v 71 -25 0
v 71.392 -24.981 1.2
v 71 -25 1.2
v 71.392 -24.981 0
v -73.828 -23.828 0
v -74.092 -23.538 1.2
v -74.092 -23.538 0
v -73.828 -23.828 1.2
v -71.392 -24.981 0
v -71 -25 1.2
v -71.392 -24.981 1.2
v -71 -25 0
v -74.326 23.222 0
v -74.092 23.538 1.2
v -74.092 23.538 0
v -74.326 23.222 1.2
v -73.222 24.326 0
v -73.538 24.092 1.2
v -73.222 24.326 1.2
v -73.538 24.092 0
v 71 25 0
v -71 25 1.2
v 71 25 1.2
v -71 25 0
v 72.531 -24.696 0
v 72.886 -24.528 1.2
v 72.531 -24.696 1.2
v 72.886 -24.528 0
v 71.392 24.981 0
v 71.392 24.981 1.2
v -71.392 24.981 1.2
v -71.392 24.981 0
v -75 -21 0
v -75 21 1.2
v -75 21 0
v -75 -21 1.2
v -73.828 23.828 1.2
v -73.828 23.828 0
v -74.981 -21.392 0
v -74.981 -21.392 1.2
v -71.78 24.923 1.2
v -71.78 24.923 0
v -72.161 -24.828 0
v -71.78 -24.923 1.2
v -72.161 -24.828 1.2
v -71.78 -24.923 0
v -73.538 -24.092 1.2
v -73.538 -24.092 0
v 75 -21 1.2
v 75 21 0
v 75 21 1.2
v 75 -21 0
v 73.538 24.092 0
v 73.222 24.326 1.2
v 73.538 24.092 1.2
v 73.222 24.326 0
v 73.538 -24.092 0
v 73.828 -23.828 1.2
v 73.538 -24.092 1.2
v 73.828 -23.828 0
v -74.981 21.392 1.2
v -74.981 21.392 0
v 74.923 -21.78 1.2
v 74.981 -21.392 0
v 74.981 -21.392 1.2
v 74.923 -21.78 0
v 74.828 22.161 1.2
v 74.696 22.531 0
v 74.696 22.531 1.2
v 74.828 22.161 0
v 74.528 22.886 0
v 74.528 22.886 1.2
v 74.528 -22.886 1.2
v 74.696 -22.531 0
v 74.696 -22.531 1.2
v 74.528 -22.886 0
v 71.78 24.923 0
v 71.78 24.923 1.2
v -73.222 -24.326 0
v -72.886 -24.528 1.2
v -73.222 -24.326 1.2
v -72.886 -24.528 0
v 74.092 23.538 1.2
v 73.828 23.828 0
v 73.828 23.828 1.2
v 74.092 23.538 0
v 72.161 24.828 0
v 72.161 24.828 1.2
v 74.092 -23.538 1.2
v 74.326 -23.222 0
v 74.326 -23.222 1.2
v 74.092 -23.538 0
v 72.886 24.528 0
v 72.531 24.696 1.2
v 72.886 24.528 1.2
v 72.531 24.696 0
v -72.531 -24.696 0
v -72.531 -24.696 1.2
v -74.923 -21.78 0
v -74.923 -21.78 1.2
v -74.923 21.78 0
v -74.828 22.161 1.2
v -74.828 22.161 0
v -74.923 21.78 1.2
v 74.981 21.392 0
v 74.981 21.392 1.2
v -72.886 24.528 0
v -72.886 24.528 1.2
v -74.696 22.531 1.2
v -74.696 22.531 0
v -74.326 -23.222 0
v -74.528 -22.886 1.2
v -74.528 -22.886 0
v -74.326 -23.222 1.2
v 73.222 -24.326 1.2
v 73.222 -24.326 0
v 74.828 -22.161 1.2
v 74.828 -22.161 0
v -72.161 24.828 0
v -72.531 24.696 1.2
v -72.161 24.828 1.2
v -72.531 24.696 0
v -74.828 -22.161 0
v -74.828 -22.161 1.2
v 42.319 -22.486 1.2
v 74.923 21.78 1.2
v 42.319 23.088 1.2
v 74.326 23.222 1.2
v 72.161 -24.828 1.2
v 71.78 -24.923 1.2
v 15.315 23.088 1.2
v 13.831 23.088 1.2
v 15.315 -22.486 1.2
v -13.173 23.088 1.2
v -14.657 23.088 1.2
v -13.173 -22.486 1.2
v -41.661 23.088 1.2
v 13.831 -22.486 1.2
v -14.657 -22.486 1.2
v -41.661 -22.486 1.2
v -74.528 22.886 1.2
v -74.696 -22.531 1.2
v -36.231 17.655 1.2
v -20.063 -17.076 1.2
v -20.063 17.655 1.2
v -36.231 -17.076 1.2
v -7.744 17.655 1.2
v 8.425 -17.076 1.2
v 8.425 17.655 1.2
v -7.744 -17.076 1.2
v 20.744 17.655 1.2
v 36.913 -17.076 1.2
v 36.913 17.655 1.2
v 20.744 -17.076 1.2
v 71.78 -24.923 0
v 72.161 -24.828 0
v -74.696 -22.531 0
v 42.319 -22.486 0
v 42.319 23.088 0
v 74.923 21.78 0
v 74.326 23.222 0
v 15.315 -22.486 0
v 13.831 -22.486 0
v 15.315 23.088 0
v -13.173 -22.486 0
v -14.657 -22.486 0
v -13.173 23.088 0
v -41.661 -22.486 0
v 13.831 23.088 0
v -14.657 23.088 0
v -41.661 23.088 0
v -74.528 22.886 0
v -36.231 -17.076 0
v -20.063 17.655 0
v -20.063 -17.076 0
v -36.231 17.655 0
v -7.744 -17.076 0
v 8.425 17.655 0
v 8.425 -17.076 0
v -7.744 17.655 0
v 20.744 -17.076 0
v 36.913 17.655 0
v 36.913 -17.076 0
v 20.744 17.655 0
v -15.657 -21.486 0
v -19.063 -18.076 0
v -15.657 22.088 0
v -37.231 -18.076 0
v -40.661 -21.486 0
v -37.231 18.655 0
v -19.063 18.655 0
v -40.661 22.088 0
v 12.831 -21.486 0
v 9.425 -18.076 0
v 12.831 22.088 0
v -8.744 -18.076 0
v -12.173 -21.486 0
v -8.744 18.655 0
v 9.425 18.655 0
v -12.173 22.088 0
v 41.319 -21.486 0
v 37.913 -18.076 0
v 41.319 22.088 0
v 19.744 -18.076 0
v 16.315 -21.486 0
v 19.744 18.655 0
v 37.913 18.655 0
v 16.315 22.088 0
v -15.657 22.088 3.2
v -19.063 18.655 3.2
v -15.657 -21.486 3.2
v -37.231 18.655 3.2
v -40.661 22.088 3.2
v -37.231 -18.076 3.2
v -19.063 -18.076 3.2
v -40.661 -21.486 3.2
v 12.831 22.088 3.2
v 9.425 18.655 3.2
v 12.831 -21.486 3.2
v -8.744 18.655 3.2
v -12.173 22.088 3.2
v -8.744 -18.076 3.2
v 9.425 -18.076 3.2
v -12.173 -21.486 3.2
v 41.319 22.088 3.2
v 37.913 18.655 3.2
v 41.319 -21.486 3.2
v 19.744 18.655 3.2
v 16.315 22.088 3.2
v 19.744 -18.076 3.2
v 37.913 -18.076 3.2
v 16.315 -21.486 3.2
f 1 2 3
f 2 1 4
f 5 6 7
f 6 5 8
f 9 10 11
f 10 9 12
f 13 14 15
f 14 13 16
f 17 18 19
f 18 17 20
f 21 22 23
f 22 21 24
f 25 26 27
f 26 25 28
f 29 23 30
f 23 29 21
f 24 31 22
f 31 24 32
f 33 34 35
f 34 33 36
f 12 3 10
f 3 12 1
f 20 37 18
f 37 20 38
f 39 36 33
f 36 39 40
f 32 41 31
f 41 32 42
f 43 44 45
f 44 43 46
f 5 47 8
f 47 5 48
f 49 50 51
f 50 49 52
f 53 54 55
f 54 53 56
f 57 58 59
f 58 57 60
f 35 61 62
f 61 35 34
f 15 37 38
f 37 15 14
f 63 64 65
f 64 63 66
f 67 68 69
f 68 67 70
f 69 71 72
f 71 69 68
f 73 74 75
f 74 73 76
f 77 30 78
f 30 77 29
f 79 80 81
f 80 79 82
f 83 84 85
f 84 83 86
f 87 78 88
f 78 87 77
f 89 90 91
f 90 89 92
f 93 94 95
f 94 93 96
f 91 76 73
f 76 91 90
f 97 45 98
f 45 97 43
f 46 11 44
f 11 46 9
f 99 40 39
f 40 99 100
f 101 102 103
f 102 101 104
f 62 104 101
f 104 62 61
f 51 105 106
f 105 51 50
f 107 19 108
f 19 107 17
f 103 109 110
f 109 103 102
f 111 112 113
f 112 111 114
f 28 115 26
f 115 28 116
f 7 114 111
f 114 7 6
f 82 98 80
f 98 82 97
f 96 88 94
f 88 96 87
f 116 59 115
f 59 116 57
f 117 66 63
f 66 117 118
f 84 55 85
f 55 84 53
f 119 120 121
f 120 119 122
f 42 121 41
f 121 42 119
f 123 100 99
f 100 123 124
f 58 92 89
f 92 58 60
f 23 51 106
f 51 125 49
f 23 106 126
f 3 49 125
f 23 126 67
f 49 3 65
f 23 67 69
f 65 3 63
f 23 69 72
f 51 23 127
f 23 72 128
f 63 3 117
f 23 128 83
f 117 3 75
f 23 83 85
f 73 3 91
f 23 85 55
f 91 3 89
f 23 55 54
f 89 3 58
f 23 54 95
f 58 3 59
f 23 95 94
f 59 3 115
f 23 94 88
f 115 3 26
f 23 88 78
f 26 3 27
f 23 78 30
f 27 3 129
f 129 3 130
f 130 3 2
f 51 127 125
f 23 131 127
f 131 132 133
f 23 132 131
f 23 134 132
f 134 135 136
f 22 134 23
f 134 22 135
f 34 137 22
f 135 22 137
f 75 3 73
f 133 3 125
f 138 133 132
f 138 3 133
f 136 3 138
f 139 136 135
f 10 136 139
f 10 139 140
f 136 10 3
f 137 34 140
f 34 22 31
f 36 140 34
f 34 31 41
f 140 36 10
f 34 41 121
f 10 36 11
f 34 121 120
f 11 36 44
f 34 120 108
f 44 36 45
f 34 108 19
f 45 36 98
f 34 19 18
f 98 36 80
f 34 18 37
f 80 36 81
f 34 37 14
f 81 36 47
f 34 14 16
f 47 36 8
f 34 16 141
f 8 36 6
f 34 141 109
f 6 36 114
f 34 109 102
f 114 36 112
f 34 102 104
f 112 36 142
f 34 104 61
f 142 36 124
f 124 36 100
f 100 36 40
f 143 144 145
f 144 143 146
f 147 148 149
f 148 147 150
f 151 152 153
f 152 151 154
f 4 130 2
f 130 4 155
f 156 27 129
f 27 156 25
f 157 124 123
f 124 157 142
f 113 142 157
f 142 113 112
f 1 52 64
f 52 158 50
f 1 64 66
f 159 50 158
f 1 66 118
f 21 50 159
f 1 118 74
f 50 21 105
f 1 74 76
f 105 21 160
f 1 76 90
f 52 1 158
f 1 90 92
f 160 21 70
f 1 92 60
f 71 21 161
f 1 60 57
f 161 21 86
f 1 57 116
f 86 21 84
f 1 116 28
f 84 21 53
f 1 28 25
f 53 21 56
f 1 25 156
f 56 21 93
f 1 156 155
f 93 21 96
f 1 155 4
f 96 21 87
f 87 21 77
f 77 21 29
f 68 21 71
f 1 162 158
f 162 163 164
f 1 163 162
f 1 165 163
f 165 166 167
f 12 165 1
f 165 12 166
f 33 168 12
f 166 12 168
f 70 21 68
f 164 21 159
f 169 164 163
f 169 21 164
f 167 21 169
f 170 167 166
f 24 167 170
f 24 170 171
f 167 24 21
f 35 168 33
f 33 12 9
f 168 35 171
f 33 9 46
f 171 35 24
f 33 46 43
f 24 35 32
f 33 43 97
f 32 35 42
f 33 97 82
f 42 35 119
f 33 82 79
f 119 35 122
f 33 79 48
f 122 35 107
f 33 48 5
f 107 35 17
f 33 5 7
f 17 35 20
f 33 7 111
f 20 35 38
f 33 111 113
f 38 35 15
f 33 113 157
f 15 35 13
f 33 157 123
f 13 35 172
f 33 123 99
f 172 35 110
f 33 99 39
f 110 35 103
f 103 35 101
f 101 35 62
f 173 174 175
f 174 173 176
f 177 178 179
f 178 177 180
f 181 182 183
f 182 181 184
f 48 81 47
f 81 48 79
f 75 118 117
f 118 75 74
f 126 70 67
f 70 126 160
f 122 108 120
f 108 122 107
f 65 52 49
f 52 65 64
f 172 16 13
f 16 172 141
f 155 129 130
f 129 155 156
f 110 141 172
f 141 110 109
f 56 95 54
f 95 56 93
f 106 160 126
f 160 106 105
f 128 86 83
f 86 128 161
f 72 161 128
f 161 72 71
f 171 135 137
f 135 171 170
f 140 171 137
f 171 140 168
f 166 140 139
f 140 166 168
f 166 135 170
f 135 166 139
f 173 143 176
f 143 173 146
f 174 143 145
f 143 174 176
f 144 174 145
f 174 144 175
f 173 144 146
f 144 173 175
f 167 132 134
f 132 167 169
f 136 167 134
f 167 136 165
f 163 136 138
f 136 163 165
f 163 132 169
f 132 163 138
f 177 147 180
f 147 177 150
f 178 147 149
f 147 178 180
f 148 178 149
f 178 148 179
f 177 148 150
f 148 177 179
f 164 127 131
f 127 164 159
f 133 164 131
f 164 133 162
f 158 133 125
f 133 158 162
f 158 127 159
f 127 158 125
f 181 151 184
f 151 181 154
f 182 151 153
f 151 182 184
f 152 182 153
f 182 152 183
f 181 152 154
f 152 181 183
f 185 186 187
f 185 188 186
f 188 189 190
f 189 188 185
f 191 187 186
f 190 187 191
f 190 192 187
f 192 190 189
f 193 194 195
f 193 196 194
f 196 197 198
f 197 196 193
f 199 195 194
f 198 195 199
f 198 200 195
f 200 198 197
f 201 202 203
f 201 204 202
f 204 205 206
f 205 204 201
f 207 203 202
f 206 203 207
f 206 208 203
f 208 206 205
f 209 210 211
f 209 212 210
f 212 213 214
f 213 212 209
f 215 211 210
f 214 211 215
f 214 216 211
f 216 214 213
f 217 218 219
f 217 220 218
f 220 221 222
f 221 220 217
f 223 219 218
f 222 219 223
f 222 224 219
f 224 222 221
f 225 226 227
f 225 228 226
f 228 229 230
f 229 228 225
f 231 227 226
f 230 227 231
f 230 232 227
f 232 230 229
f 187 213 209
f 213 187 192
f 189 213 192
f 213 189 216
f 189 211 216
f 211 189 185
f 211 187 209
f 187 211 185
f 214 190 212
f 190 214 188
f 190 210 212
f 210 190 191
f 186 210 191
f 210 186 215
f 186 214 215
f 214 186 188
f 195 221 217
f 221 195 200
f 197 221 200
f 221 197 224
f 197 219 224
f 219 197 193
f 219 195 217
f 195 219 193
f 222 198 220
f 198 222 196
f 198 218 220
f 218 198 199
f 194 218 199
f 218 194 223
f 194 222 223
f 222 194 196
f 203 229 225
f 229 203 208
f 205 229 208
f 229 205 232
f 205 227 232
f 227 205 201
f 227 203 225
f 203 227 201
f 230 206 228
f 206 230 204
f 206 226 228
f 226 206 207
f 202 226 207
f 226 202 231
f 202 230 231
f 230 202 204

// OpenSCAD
$fn = 64;

// =====================
// 全局参数（两部分共用）
// =====================
plate_w = 150;
plate_h = 50;
plate_t = 1.2;
corner_r = 4;

text_str  = "知行室";
text_size = 35;
font_name = "Heiti SC:style=Regular";

text_height = 3.2;

// 笔画连接（防止中文断裂）
stroke_join = 0.35;

// 装配间隙（阴文孔 > 阳文字）
fit_gap = 1;

// 阴阳文之间的展示间距
spacing = 160;


// =====================
// 工具模块
// =====================

// 圆角矩形
module rounded_rect(w, h, r) {
    offset(r = r)
        square([w - 2*r, h - 2*r], center = true);
}

// 文字轮廓（统一来源）
module text_shape(delta = 0) {
    offset(delta = delta)
        text(
            text_str,
            size = text_size,
            font = font_name,
            halign = "center",
            valign = "center"
        );
}


// =====================
// 阴文（底板挖空）
// =====================
module yin_plate() {
    difference() {

        // 底板
        linear_extrude(height = plate_t)
            rounded_rect(plate_w, plate_h, corner_r);

        // 挖空文字（略大，形成装配间隙）
        translate([0, 0, -0.1])
            linear_extrude(height = plate_t + 0.2)
                text_shape(delta = stroke_join + fit_gap);
    }
}


// =====================
// 阳文（嵌入字块）
// =====================
module yang_text() {
    linear_extrude(height = text_height)
        text_shape(delta = stroke_join);
}


// =====================
// 组合展示
// =====================

// 左：阴文
translate([0, 0, 0])
    yin_plate();

// 右：阳文
translate([ 0, 0, 0])
    yang_text();
